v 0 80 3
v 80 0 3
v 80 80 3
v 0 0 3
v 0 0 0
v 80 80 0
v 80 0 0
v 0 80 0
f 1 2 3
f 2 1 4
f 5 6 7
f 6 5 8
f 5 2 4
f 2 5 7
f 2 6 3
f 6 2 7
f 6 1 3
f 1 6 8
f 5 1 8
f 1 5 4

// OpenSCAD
/*
Title: Scaffold - Coil Motor Geometry Demonstrator
Folder: 18_advanced_electromechanics
Physics Topic: Planned extension
Difficulty: Scaffold
Print Type: FDM
Teaches: Future concept module
Use Case: Planned classroom extension
*/

// --------------------
// Parameters
// --------------------
base_size = 80;
thickness = 3;

module scaffold_placeholder(){
    cube([base_size,base_size,thickness]);
}

// --------------------
// Physics Meaning
// --------------------
// Scaffold file with geometry placeholder and planned educational direction.

// --------------------
// Learning Notes
// --------------------
// TODO: add activity prompts and comparative parameter sweeps.

// --------------------
// Print Notes
// --------------------
// TODO: finalize orientation and durability tuning.

// --------------------
// Customization Ideas
// --------------------
// TODO: convert placeholder to fully featured model in roadmap sequence.

scaffold_placeholder();
